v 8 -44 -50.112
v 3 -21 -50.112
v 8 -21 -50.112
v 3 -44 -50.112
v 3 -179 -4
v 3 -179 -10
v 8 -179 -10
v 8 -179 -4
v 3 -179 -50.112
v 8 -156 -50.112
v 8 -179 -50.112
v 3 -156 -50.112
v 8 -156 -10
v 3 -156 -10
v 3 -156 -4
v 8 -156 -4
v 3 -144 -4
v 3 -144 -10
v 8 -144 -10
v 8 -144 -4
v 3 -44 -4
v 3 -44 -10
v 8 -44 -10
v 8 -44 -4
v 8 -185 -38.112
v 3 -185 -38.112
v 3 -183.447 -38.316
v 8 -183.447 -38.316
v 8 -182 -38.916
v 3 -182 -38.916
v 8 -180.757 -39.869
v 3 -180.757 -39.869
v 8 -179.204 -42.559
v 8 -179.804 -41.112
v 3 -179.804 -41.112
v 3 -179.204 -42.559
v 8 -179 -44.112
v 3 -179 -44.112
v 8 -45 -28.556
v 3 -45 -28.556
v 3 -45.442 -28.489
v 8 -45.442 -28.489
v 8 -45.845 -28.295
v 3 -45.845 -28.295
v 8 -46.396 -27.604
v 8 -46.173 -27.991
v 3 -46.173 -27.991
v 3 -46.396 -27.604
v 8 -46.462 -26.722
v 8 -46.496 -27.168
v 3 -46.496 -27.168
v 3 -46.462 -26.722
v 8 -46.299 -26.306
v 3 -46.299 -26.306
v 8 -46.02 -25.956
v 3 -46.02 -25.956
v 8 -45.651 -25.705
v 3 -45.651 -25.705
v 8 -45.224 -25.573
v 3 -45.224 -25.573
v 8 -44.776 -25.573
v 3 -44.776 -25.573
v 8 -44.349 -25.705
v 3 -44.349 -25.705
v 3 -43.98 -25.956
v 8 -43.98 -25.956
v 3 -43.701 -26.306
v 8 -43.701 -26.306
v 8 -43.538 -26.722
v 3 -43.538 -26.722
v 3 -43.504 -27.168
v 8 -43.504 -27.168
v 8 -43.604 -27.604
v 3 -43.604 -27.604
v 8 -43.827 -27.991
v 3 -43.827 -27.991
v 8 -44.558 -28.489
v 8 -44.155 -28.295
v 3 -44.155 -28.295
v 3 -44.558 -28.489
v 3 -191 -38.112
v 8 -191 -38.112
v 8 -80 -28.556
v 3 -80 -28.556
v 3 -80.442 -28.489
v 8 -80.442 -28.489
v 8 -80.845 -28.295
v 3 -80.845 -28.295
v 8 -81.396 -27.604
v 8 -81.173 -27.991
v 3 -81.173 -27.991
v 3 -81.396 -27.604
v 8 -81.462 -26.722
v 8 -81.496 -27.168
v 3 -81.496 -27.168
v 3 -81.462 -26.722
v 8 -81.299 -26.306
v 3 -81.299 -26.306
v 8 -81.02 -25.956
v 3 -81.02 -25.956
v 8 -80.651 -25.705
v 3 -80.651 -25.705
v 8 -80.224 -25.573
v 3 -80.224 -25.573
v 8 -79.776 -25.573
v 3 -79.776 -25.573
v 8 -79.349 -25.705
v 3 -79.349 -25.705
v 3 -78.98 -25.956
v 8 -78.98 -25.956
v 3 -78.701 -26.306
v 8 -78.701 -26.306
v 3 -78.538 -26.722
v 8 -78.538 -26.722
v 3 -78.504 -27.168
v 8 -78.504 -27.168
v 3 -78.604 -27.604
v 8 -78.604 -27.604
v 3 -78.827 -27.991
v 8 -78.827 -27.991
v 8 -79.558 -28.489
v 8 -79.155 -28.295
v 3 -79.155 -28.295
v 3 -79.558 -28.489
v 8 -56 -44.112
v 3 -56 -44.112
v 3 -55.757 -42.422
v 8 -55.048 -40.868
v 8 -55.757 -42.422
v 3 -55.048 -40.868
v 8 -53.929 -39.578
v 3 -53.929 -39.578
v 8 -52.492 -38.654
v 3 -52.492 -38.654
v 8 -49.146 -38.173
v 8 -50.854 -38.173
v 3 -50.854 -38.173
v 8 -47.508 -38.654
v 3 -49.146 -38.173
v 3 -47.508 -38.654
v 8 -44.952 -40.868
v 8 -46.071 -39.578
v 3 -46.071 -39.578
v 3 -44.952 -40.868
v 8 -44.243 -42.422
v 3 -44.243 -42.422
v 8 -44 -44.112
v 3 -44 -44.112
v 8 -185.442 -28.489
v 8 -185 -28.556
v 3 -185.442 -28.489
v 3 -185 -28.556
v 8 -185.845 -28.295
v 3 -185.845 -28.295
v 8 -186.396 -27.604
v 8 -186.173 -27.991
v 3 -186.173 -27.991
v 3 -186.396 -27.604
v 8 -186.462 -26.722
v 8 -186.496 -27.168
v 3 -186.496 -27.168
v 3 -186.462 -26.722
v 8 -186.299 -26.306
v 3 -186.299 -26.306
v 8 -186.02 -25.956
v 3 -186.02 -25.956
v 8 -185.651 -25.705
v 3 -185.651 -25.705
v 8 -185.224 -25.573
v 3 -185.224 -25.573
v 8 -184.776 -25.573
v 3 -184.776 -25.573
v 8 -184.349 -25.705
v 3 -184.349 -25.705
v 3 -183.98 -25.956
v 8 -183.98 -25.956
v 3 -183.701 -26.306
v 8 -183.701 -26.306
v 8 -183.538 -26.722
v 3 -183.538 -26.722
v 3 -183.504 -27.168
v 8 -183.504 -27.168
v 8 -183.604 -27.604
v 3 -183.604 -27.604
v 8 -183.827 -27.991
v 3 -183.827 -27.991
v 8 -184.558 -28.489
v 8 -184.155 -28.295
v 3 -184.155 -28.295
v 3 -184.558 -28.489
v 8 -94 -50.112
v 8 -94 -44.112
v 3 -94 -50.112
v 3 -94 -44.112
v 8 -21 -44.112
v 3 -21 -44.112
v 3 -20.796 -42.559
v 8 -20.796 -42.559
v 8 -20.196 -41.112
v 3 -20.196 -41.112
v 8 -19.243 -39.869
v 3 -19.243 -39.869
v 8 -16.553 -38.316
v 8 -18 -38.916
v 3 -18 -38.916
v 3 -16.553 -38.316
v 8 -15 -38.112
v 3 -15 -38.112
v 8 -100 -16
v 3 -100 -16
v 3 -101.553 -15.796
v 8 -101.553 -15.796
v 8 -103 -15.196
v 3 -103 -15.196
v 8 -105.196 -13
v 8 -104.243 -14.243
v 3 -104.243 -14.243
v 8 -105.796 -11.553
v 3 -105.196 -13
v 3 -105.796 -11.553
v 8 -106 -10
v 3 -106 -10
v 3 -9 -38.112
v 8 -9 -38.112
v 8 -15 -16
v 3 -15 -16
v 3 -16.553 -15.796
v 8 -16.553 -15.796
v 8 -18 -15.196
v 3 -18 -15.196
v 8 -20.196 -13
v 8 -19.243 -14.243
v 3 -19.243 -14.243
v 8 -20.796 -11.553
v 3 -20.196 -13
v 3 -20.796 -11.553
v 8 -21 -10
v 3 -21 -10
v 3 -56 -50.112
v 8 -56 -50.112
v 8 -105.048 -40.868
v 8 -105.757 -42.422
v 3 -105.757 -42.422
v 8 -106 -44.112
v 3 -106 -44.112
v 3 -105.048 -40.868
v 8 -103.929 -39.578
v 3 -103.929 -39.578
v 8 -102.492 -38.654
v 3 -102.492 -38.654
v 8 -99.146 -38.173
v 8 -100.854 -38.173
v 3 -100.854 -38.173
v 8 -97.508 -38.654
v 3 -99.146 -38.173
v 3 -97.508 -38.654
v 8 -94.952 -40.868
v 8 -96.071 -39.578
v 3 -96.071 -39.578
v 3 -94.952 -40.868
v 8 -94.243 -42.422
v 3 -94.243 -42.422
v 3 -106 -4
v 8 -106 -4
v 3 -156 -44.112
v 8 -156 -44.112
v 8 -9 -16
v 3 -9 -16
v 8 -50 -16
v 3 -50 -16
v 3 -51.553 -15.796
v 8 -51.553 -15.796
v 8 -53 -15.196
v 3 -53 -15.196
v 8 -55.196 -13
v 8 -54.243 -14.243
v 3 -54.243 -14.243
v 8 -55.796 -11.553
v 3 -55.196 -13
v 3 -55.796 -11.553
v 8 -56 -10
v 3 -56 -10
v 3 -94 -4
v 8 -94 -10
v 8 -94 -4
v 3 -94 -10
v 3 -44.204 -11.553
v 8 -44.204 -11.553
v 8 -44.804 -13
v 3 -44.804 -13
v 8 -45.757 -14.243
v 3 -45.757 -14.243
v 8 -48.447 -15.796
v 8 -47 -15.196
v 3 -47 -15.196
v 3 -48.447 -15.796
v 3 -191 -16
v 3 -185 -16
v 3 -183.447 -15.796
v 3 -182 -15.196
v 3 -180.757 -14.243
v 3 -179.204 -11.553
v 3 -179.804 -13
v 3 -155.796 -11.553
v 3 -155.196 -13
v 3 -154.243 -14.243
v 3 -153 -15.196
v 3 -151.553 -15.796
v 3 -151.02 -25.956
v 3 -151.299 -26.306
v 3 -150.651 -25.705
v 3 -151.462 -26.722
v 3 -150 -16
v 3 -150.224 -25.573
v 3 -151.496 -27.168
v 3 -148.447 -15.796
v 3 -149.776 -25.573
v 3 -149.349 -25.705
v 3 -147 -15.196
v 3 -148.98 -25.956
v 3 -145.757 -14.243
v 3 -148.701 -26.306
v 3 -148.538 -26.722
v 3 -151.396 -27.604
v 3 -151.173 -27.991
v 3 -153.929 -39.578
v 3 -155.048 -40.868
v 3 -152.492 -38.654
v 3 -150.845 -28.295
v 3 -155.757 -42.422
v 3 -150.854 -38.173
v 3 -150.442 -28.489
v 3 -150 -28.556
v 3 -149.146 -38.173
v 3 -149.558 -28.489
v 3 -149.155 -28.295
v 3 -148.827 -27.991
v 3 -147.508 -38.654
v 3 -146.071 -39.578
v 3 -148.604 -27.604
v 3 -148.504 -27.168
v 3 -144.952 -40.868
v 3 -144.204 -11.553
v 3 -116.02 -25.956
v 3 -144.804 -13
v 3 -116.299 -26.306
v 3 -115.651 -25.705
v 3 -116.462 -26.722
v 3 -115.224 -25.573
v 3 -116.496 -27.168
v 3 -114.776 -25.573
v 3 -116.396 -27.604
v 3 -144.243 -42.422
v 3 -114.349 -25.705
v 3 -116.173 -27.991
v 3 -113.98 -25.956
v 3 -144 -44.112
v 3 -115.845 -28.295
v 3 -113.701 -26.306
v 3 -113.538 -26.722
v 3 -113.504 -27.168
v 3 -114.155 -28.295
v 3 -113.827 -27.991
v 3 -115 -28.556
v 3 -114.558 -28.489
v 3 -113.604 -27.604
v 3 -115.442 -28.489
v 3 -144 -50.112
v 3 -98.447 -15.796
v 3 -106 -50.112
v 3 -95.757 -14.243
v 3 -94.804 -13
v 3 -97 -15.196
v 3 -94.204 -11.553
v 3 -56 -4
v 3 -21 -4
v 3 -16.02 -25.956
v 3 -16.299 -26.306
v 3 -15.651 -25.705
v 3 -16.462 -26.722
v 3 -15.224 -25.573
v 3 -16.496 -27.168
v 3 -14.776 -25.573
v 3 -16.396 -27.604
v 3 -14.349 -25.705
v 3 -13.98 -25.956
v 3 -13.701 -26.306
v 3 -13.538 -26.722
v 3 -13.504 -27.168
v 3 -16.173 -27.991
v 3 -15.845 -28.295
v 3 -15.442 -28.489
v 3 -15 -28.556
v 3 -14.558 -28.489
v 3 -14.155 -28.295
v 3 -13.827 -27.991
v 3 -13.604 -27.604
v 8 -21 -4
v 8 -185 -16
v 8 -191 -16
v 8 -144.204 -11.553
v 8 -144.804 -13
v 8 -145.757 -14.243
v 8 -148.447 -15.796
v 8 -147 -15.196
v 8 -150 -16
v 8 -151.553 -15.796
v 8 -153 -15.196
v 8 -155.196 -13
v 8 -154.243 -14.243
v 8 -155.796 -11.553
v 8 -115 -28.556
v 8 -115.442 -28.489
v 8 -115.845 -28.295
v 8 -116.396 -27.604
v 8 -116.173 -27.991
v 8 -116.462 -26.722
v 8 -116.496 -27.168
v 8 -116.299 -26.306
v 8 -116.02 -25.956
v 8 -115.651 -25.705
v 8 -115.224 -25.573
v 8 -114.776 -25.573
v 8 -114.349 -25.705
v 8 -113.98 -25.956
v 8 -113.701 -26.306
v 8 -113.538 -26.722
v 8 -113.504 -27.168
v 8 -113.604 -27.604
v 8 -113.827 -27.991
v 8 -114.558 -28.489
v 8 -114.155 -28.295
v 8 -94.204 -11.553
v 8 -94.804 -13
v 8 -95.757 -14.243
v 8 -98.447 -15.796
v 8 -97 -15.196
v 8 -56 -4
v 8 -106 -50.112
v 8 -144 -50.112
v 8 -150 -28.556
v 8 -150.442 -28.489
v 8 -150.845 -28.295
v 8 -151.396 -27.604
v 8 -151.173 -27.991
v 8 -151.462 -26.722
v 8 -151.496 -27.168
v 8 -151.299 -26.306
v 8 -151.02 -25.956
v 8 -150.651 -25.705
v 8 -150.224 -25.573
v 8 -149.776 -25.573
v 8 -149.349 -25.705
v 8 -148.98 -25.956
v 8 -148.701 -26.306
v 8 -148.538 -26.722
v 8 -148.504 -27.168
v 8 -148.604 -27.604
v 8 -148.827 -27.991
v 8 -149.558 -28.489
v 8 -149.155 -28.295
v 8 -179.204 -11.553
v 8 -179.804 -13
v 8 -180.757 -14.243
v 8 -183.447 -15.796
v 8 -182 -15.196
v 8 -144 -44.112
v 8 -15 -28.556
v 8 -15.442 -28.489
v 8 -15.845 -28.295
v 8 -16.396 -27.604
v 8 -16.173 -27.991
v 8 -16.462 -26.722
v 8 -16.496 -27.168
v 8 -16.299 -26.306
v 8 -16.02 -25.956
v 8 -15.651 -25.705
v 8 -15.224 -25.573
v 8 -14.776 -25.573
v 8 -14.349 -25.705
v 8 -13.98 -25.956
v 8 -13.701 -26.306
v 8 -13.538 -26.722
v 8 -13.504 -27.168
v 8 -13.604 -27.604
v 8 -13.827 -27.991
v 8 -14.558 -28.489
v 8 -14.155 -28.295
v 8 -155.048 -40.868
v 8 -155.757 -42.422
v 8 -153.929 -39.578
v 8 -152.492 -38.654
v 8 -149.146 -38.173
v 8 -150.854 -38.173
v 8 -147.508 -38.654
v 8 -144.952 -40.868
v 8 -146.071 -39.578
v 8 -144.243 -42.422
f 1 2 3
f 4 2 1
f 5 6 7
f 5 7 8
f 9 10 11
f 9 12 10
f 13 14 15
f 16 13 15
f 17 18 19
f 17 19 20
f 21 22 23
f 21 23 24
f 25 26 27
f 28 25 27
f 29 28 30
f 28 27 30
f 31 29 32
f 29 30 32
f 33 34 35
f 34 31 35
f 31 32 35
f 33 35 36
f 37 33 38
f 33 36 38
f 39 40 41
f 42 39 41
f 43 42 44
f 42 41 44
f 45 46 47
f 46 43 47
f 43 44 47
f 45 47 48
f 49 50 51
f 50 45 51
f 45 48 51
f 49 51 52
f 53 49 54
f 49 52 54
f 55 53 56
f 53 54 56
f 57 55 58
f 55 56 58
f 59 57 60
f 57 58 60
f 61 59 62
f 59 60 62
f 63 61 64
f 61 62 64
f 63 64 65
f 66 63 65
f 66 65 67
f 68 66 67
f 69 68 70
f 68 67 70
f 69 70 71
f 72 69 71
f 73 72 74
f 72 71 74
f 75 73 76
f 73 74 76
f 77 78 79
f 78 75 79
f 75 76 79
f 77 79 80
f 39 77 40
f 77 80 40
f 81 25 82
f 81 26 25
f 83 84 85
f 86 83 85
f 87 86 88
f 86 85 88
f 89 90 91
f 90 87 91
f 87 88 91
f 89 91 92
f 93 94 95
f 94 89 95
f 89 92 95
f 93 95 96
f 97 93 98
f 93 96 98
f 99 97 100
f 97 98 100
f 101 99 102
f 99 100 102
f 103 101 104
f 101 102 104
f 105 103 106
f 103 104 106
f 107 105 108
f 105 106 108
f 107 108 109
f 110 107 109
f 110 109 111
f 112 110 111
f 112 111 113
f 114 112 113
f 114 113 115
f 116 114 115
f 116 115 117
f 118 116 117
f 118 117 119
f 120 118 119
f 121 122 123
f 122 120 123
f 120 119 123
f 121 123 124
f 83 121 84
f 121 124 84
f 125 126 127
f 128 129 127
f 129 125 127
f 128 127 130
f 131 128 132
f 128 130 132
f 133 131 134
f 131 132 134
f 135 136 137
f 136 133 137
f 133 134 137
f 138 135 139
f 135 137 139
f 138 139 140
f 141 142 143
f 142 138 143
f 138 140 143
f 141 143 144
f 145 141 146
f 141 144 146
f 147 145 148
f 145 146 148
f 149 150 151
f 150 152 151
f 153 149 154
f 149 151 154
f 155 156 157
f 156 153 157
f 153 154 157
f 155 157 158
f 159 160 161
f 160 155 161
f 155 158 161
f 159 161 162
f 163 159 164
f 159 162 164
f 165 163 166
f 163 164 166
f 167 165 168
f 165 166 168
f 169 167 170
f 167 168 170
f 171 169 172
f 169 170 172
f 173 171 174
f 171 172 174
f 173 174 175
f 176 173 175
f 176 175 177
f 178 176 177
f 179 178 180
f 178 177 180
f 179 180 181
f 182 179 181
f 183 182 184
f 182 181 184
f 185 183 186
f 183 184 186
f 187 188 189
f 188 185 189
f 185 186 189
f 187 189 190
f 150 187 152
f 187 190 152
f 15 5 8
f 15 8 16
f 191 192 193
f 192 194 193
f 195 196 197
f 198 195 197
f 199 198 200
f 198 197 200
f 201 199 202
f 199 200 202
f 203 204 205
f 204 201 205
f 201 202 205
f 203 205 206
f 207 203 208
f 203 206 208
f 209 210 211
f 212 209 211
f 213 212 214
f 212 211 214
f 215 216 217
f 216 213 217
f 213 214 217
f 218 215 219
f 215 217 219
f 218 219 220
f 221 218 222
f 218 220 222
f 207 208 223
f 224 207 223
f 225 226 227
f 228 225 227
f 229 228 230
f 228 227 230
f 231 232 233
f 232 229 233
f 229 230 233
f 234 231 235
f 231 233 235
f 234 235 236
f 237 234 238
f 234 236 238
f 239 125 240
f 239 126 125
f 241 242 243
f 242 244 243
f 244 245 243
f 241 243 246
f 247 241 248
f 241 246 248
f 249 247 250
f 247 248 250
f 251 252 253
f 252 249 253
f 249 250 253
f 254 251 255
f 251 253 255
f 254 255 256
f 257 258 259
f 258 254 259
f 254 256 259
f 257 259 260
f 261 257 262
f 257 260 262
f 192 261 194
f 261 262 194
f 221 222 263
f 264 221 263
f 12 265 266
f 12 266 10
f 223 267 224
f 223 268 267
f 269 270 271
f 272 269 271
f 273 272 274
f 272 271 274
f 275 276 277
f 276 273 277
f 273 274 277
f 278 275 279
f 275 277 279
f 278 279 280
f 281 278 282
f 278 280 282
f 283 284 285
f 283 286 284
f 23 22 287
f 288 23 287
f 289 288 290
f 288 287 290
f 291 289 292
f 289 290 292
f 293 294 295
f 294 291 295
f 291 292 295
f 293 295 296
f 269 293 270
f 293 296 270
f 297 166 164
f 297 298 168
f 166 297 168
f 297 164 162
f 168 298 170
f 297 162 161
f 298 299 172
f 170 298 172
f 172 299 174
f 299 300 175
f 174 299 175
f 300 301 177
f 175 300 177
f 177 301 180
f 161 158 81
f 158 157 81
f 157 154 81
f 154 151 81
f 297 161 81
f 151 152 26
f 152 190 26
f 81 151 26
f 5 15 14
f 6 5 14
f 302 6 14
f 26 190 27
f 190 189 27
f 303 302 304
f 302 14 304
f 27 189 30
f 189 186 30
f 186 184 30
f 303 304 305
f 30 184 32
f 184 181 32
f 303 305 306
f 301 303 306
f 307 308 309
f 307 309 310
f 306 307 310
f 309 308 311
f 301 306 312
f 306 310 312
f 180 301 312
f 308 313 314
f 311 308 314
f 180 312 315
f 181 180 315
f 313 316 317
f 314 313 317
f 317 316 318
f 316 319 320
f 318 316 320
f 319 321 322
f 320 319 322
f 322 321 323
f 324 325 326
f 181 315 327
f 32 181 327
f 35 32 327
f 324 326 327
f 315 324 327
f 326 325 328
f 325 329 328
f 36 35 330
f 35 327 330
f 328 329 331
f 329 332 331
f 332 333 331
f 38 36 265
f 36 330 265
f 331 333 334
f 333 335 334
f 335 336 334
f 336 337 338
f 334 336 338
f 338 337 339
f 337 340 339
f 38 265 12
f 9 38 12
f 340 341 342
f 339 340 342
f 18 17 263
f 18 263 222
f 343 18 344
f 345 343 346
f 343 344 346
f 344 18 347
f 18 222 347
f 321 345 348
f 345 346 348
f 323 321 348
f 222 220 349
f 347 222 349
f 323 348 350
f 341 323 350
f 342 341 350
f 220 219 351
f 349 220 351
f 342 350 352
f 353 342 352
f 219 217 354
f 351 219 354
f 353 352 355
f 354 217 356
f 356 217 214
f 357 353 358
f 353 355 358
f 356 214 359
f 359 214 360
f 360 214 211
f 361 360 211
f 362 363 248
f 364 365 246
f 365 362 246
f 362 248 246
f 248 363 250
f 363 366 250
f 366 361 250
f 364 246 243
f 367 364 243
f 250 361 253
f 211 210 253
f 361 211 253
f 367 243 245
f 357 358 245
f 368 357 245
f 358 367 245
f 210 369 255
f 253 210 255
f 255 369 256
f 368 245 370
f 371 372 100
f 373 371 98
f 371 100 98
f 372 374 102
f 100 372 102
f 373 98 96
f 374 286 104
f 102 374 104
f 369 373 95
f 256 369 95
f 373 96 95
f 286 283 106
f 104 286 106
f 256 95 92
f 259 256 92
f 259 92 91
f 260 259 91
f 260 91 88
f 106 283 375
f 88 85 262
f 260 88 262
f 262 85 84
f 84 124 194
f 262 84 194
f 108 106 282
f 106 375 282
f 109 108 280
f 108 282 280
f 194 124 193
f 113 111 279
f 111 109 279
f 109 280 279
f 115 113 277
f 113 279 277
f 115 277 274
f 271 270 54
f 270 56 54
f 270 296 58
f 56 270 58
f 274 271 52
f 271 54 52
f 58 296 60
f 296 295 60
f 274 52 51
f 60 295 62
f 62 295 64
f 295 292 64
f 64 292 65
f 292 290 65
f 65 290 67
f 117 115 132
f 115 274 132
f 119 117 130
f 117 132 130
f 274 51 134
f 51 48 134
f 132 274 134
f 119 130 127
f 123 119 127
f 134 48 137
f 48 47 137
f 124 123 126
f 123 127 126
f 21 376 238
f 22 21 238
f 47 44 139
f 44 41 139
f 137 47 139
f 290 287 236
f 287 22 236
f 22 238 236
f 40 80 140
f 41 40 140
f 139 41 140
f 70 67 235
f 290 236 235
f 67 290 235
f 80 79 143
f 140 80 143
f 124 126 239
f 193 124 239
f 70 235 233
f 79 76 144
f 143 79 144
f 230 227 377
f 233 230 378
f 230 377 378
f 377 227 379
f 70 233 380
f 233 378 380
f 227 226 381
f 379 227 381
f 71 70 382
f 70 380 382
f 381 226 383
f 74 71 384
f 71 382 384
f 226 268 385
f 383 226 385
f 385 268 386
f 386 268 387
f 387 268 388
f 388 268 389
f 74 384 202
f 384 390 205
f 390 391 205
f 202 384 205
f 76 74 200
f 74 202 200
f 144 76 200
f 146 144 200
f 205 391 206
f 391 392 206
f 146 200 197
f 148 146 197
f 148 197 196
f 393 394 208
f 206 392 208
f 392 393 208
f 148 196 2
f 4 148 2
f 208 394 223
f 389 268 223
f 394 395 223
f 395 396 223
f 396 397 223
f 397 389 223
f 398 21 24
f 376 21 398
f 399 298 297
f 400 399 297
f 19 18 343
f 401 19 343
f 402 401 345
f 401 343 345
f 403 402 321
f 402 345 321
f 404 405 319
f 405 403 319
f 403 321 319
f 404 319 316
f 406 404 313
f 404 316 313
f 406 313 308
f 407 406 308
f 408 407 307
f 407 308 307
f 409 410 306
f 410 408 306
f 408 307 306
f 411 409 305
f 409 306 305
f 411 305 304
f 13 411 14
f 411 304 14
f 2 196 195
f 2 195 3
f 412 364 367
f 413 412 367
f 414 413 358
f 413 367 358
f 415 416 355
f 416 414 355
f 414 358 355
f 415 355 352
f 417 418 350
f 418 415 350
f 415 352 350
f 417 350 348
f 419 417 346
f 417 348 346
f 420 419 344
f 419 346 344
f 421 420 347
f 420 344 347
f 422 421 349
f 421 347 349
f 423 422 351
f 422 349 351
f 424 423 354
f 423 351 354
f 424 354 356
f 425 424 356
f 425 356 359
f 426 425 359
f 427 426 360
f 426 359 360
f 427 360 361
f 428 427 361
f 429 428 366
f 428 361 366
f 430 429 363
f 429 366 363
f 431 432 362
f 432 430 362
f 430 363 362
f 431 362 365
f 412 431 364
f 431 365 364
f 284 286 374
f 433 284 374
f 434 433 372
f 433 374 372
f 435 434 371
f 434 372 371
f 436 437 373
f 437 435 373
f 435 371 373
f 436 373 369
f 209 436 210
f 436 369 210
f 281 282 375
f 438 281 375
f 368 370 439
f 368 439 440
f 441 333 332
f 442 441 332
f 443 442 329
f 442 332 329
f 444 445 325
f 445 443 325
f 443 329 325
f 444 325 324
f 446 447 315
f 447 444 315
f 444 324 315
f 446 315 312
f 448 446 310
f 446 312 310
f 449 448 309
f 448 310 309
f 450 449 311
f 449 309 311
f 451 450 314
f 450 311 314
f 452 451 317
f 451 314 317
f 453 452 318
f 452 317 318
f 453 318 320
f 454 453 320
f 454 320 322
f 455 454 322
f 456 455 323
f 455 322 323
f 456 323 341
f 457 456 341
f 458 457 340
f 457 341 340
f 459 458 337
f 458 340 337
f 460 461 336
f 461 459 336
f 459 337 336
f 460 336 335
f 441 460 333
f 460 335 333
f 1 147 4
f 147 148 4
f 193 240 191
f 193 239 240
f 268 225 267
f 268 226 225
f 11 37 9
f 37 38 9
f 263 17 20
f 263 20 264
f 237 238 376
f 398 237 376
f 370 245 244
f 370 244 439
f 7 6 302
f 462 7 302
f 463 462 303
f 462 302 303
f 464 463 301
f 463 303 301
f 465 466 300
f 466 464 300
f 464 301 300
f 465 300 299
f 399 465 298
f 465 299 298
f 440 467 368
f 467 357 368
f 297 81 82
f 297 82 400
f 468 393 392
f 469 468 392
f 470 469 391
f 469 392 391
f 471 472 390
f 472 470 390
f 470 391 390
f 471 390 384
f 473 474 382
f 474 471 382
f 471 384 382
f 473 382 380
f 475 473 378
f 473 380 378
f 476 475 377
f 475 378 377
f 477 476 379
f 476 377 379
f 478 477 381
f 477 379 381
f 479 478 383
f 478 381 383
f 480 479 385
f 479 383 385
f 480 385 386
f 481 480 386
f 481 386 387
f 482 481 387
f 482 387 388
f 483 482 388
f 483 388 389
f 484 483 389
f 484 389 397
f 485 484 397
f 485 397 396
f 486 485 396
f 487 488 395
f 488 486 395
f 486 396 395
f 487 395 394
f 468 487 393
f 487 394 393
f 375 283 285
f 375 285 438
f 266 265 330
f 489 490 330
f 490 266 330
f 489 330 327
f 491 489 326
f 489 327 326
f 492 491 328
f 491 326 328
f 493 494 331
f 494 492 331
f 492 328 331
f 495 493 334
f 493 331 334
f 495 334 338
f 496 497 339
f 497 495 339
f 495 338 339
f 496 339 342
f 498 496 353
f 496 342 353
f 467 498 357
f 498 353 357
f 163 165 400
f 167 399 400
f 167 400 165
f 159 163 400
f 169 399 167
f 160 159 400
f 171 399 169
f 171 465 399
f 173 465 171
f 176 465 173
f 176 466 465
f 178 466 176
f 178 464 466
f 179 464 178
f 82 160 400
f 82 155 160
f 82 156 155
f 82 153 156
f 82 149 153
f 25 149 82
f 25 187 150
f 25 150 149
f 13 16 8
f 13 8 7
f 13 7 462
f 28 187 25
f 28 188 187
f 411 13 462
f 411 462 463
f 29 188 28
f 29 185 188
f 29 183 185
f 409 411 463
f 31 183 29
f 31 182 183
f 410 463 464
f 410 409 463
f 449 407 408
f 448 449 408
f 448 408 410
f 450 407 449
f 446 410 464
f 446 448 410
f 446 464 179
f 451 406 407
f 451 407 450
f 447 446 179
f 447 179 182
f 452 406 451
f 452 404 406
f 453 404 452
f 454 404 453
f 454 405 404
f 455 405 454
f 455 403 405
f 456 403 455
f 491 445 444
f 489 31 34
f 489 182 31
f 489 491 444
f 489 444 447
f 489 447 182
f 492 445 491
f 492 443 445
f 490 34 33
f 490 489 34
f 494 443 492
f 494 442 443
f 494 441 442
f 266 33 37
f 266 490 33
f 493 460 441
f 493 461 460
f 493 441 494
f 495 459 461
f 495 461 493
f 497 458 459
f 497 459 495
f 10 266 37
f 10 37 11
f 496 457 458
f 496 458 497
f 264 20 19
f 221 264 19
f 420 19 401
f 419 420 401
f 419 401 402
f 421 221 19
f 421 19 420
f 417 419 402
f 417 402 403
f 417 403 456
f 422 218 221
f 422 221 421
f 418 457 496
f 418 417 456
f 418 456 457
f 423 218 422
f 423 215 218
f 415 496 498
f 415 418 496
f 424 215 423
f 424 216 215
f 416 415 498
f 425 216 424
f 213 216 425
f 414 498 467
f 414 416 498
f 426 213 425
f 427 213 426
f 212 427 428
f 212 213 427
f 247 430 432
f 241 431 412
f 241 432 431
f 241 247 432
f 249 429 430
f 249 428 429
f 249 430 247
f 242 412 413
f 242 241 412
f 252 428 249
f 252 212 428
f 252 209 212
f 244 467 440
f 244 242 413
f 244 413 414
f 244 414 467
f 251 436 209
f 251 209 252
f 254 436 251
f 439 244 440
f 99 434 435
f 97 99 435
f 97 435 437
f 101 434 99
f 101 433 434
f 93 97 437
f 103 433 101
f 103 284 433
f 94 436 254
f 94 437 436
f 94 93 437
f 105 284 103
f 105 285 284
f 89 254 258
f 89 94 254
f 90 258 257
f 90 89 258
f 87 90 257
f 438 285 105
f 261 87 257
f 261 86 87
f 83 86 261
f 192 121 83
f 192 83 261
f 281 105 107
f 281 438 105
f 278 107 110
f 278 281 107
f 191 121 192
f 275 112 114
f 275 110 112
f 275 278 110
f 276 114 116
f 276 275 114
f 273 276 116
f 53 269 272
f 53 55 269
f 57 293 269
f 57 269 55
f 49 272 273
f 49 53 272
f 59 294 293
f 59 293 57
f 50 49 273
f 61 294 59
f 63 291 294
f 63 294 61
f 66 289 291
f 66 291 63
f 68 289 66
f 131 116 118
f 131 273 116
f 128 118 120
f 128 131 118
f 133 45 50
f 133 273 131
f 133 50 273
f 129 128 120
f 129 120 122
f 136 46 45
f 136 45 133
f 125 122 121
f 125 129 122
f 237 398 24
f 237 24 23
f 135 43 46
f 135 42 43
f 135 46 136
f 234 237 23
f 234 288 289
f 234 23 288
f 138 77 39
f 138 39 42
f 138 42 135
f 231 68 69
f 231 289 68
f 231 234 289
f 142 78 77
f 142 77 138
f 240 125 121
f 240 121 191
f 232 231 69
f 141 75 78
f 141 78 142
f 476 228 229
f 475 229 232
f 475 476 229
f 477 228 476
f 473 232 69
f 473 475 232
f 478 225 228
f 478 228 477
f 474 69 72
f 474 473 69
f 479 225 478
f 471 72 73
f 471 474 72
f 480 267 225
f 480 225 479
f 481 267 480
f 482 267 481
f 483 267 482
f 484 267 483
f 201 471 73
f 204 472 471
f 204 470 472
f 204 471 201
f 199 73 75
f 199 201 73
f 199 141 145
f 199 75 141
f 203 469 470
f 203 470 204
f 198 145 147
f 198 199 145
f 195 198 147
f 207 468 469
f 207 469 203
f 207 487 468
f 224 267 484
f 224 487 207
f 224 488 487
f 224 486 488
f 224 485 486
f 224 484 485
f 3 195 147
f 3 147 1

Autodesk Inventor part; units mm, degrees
ref_plane "YZ Plane" through (0, 0, 0) normal (1, 0, 0) x (0, 1, 0)
ref_plane "XZ Plane" through (0, 0, 0) normal (0, 1, 0) x (-1, 0, 0)
ref_plane "Work Plane2" through (3, -200, 0) normal (1, 0, 0) x (0, 0, -1)
sketch "Sketch1" plane through (3, -200, 0) normal (1, 0, 0) x (0, 0, -1)
  circle A0 centre (10, 15) radius 2.5 projected
  circle A1 centre (10, 15) radius 6
  circle A2 centre (44.112, 15) radius 2.5 projected
  circle A3 centre (44.112, 15) radius 6
  circle A4 centre (44.112, 50) radius 2.5 projected
  circle A5 centre (44.112, 50) radius 6
  circle A6 centre (10, 50) radius 2.5 projected
  circle A7 centre (10, 50) radius 6
  circle A8 centre (10, 100) radius 2.5 projected
  circle A9 centre (10, 100) radius 6
  circle A10 centre (44.112, 100) radius 2.5 projected
  circle A11 centre (44.112, 100) radius 6
  circle A12 centre (10, 150) radius 2.5 projected
  circle A13 centre (10, 150) radius 6
  circle A14 centre (44.112, 150) radius 2.5 projected
  circle A15 centre (44.112, 150) radius 6
  circle A16 centre (10, 185) radius 2.5 projected
  circle A17 centre (10, 185) radius 6
  circle A18 centre (44.112, 185) radius 2.5 projected
  circle A19 centre (44.112, 185) radius 6
  circle A20 centre (27.056, 185) radius 1.5 projected
  circle A21 centre (27.056, 185) radius 1.5
  circle A22 centre (27.056, 155) radius 1.5 projected
  circle A23 centre (27.056, 155) radius 1.5
  circle A24 centre (27.056, 120) radius 1.5 projected
  circle A25 centre (27.056, 120) radius 1.5
  circle A26 centre (27.056, 85) radius 1.5 projected
  circle A27 centre (27.056, 85) radius 1.5
  circle A28 centre (27.056, 50) radius 1.5 projected
  circle A29 centre (27.056, 50) radius 1.5
  circle A30 centre (27.056, 15) radius 1.5 projected
  circle A31 centre (27.056, 15) radius 1.5
  line L0 (44.112, 9) -> (50.112, 9)
  line L1 (10, 9) -> (4, 9)
  line L2 (10, 191) -> (4, 191)
  line L3 (44.112, 191) -> (50.112, 191)
  line L4 (4, 191) -> (50.112, 191)
  line L5 (50.112, 191) -> (50.112, 9)
  line L6 (50.112, 9) -> (4, 9)
  line L7 (4, 9) -> (4, 191)
  line L8 (10, 56) -> (4, 56)
  line L9 (10, 44) -> (4, 44)
  line L10 (44.112, 56) -> (50.112, 56)
  line L11 (44.112, 44) -> (50.112, 44)
  line L12 (44.112, 21) -> (50.112, 21)
  line L13 (10, 21) -> (4, 21)
  line L14 (10, 94) -> (4, 94)
  line L15 (10, 106) -> (4, 106)
  line L16 (10, 144) -> (4, 144)
  line L17 (10, 156) -> (4, 156)
  line L18 (44.112, 156) -> (50.112, 156)
  line L19 (44.112, 144) -> (50.112, 144)
  line L20 (44.112, 179) -> (50.112, 179)
  line L21 (10, 179) -> (4, 179)
  line L22 (16, 185) -> (16, 191)
  line L23 (38.112, 185) -> (38.112, 191)
  line L24 (16, 15) -> (16, 9)
  line L25 (38.112, 15) -> (38.112, 9)
  line L26 (44.112, 106) -> (50.112, 106)
  line L27 (44.112, 94) -> (50.112, 94)
  point P0 (0, 200)
  point P1 (50.112, 100)
  dimension "d1" = 12
  dimension "d2" = 12
  dimension "d3" = 12
  dimension "d4" = 12
  dimension "d5" = 12
  dimension "d6" = 12
  dimension "d7" = 12
  dimension "d8" = 12
  dimension "d9" = 12
  dimension "d10" = 12
extrude "Extrusion1" add sketch "Sketch1" along normal blind 5 contours A1 L13 L7 L9 A7 L8 L14 A9 L15 L16 A13 L17 L21 A17 L22 L4 L23 A19 L20 L5 L18 A15 L19 L26 A11 L27 L10 A5 L11 L12 A3 L25 L6 L24
equation "\"BendRadius\" = Thickness"
equation "\"BendReliefWidth\" = Thickness"
equation "\"BendReliefDepth\" = 0.5 * Thickness"
equation "\"CornerReliefSize\" = 4 * Thickness"
equation "\"MinimumRemnant\" = 2 * Thickness"
equation "\"TransitionRadius\" = BendRadius"
equation "\"JacobiRadiusSize\" = BendRadius"
equation "\"GapSize\" = Thickness"
equation "\"Thickness\" = 0.5"
properties part number "linrail_screw_spacer" material "PET Plastic"
